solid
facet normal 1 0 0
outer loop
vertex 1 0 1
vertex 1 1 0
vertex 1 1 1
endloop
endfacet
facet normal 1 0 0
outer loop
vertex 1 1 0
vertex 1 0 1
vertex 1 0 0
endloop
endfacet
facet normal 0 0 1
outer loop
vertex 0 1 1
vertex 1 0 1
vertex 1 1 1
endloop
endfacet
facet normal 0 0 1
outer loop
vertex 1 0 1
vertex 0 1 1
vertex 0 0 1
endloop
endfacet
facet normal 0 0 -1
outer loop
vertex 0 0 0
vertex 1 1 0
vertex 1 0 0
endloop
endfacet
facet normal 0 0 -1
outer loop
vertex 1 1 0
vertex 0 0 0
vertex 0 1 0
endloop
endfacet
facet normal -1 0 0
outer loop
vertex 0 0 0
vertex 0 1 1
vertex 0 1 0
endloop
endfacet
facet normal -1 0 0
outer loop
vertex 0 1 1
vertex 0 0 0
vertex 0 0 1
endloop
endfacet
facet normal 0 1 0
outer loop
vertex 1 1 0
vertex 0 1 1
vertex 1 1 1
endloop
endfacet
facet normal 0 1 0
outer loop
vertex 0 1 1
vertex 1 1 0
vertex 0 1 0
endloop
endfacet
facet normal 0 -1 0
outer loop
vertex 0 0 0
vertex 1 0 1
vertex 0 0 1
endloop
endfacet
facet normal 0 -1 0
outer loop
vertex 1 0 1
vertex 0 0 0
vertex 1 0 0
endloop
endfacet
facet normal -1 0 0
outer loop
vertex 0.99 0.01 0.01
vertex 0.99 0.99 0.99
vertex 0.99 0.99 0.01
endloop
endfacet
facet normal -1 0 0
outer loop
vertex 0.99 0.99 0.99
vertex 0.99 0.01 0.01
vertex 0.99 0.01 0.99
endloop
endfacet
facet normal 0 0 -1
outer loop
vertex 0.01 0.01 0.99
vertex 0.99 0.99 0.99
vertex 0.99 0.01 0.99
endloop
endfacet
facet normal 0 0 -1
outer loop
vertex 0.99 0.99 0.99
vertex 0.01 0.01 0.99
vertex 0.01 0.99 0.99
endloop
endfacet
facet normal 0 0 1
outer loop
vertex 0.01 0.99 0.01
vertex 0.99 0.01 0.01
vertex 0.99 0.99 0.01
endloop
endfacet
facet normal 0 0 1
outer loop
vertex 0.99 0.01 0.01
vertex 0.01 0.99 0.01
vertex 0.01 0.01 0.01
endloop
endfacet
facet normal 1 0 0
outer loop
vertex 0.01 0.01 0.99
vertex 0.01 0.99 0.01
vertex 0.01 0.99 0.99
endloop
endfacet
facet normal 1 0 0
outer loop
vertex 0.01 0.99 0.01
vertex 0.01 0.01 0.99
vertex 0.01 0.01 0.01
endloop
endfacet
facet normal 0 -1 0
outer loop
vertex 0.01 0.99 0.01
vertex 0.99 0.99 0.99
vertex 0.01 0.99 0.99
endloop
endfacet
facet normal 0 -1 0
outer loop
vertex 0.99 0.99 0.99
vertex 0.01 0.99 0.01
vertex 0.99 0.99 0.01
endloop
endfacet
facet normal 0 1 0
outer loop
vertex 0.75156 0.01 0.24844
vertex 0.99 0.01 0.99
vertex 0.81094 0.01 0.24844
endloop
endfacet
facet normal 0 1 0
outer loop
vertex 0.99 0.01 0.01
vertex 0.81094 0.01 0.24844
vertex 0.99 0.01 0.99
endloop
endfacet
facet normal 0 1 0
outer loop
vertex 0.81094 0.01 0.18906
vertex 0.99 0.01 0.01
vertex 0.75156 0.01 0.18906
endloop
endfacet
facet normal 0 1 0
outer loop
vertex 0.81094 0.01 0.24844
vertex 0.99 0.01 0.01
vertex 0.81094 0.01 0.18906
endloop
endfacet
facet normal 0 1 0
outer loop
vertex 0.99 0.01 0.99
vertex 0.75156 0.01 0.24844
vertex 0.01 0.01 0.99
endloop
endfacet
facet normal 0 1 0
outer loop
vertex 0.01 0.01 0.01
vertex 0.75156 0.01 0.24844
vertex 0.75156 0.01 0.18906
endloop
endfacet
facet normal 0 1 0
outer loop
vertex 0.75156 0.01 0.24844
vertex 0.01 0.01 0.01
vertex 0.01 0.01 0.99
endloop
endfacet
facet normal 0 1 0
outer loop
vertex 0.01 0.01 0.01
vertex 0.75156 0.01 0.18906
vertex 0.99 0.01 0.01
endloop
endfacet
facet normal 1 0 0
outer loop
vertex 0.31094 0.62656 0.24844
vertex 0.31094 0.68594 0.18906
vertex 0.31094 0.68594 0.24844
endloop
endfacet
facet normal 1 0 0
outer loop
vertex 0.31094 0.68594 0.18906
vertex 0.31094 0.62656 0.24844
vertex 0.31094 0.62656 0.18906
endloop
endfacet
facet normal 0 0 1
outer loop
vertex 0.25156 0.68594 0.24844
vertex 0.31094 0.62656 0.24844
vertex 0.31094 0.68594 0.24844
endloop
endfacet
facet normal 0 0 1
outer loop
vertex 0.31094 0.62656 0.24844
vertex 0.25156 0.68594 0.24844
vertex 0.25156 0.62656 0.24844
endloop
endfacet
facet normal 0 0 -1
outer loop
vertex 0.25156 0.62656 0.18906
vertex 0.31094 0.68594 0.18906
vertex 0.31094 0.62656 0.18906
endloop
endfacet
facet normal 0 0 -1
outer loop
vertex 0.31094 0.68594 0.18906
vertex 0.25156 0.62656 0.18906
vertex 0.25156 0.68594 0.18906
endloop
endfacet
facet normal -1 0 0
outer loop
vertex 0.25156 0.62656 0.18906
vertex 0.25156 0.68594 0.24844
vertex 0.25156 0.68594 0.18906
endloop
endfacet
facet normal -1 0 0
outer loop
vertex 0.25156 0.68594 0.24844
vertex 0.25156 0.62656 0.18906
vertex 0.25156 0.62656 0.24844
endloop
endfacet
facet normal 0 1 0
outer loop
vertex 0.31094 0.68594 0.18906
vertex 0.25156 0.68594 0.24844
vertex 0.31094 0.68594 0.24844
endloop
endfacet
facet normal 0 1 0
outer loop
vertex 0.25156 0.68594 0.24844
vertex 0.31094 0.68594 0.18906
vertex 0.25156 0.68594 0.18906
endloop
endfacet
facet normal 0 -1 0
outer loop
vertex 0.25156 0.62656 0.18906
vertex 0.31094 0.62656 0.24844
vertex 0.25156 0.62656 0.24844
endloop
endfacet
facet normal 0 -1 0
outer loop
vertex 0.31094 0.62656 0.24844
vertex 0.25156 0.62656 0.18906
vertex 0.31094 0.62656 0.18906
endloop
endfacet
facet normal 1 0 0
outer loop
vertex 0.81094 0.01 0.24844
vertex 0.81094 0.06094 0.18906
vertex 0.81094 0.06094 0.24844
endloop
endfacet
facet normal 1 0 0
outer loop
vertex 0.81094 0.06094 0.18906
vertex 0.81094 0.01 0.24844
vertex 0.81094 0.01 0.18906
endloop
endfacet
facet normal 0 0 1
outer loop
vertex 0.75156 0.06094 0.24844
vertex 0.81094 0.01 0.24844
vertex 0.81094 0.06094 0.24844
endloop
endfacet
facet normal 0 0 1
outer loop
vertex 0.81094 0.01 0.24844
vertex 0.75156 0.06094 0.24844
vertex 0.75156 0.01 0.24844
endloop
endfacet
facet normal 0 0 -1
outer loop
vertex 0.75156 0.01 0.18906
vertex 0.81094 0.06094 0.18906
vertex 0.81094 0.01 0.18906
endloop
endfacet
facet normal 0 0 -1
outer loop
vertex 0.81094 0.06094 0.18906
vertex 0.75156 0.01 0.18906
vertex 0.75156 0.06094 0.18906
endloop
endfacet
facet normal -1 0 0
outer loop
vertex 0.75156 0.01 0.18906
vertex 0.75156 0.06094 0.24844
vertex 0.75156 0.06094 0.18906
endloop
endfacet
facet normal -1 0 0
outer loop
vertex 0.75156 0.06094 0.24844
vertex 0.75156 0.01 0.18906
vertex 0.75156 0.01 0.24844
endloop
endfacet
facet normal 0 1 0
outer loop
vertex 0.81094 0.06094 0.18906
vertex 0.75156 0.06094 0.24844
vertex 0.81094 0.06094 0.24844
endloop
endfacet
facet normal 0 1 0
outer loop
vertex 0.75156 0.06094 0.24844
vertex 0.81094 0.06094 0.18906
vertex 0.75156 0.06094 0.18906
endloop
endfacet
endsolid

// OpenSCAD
translate([0.28125, 0.65625, 0.21875]) color([0.6652757233710683, 0.22263754843686523, 0.08942086350367451]) cube([0.059375, 0.059375, 0.059375], center=true);
translate([0.78125, 0.03125, 0.21875]) color([0.6195232841458308, 0.9036720387350747, 0.7222923954673625]) cube([0.059375, 0.059375, 0.059375], center=true);
color([0.3,0.3,0.3,0.3]) difference() { cube([1,1,1]); translate([0.01,0.01,0.01]) cube([0.98,0.98,0.98]); }
